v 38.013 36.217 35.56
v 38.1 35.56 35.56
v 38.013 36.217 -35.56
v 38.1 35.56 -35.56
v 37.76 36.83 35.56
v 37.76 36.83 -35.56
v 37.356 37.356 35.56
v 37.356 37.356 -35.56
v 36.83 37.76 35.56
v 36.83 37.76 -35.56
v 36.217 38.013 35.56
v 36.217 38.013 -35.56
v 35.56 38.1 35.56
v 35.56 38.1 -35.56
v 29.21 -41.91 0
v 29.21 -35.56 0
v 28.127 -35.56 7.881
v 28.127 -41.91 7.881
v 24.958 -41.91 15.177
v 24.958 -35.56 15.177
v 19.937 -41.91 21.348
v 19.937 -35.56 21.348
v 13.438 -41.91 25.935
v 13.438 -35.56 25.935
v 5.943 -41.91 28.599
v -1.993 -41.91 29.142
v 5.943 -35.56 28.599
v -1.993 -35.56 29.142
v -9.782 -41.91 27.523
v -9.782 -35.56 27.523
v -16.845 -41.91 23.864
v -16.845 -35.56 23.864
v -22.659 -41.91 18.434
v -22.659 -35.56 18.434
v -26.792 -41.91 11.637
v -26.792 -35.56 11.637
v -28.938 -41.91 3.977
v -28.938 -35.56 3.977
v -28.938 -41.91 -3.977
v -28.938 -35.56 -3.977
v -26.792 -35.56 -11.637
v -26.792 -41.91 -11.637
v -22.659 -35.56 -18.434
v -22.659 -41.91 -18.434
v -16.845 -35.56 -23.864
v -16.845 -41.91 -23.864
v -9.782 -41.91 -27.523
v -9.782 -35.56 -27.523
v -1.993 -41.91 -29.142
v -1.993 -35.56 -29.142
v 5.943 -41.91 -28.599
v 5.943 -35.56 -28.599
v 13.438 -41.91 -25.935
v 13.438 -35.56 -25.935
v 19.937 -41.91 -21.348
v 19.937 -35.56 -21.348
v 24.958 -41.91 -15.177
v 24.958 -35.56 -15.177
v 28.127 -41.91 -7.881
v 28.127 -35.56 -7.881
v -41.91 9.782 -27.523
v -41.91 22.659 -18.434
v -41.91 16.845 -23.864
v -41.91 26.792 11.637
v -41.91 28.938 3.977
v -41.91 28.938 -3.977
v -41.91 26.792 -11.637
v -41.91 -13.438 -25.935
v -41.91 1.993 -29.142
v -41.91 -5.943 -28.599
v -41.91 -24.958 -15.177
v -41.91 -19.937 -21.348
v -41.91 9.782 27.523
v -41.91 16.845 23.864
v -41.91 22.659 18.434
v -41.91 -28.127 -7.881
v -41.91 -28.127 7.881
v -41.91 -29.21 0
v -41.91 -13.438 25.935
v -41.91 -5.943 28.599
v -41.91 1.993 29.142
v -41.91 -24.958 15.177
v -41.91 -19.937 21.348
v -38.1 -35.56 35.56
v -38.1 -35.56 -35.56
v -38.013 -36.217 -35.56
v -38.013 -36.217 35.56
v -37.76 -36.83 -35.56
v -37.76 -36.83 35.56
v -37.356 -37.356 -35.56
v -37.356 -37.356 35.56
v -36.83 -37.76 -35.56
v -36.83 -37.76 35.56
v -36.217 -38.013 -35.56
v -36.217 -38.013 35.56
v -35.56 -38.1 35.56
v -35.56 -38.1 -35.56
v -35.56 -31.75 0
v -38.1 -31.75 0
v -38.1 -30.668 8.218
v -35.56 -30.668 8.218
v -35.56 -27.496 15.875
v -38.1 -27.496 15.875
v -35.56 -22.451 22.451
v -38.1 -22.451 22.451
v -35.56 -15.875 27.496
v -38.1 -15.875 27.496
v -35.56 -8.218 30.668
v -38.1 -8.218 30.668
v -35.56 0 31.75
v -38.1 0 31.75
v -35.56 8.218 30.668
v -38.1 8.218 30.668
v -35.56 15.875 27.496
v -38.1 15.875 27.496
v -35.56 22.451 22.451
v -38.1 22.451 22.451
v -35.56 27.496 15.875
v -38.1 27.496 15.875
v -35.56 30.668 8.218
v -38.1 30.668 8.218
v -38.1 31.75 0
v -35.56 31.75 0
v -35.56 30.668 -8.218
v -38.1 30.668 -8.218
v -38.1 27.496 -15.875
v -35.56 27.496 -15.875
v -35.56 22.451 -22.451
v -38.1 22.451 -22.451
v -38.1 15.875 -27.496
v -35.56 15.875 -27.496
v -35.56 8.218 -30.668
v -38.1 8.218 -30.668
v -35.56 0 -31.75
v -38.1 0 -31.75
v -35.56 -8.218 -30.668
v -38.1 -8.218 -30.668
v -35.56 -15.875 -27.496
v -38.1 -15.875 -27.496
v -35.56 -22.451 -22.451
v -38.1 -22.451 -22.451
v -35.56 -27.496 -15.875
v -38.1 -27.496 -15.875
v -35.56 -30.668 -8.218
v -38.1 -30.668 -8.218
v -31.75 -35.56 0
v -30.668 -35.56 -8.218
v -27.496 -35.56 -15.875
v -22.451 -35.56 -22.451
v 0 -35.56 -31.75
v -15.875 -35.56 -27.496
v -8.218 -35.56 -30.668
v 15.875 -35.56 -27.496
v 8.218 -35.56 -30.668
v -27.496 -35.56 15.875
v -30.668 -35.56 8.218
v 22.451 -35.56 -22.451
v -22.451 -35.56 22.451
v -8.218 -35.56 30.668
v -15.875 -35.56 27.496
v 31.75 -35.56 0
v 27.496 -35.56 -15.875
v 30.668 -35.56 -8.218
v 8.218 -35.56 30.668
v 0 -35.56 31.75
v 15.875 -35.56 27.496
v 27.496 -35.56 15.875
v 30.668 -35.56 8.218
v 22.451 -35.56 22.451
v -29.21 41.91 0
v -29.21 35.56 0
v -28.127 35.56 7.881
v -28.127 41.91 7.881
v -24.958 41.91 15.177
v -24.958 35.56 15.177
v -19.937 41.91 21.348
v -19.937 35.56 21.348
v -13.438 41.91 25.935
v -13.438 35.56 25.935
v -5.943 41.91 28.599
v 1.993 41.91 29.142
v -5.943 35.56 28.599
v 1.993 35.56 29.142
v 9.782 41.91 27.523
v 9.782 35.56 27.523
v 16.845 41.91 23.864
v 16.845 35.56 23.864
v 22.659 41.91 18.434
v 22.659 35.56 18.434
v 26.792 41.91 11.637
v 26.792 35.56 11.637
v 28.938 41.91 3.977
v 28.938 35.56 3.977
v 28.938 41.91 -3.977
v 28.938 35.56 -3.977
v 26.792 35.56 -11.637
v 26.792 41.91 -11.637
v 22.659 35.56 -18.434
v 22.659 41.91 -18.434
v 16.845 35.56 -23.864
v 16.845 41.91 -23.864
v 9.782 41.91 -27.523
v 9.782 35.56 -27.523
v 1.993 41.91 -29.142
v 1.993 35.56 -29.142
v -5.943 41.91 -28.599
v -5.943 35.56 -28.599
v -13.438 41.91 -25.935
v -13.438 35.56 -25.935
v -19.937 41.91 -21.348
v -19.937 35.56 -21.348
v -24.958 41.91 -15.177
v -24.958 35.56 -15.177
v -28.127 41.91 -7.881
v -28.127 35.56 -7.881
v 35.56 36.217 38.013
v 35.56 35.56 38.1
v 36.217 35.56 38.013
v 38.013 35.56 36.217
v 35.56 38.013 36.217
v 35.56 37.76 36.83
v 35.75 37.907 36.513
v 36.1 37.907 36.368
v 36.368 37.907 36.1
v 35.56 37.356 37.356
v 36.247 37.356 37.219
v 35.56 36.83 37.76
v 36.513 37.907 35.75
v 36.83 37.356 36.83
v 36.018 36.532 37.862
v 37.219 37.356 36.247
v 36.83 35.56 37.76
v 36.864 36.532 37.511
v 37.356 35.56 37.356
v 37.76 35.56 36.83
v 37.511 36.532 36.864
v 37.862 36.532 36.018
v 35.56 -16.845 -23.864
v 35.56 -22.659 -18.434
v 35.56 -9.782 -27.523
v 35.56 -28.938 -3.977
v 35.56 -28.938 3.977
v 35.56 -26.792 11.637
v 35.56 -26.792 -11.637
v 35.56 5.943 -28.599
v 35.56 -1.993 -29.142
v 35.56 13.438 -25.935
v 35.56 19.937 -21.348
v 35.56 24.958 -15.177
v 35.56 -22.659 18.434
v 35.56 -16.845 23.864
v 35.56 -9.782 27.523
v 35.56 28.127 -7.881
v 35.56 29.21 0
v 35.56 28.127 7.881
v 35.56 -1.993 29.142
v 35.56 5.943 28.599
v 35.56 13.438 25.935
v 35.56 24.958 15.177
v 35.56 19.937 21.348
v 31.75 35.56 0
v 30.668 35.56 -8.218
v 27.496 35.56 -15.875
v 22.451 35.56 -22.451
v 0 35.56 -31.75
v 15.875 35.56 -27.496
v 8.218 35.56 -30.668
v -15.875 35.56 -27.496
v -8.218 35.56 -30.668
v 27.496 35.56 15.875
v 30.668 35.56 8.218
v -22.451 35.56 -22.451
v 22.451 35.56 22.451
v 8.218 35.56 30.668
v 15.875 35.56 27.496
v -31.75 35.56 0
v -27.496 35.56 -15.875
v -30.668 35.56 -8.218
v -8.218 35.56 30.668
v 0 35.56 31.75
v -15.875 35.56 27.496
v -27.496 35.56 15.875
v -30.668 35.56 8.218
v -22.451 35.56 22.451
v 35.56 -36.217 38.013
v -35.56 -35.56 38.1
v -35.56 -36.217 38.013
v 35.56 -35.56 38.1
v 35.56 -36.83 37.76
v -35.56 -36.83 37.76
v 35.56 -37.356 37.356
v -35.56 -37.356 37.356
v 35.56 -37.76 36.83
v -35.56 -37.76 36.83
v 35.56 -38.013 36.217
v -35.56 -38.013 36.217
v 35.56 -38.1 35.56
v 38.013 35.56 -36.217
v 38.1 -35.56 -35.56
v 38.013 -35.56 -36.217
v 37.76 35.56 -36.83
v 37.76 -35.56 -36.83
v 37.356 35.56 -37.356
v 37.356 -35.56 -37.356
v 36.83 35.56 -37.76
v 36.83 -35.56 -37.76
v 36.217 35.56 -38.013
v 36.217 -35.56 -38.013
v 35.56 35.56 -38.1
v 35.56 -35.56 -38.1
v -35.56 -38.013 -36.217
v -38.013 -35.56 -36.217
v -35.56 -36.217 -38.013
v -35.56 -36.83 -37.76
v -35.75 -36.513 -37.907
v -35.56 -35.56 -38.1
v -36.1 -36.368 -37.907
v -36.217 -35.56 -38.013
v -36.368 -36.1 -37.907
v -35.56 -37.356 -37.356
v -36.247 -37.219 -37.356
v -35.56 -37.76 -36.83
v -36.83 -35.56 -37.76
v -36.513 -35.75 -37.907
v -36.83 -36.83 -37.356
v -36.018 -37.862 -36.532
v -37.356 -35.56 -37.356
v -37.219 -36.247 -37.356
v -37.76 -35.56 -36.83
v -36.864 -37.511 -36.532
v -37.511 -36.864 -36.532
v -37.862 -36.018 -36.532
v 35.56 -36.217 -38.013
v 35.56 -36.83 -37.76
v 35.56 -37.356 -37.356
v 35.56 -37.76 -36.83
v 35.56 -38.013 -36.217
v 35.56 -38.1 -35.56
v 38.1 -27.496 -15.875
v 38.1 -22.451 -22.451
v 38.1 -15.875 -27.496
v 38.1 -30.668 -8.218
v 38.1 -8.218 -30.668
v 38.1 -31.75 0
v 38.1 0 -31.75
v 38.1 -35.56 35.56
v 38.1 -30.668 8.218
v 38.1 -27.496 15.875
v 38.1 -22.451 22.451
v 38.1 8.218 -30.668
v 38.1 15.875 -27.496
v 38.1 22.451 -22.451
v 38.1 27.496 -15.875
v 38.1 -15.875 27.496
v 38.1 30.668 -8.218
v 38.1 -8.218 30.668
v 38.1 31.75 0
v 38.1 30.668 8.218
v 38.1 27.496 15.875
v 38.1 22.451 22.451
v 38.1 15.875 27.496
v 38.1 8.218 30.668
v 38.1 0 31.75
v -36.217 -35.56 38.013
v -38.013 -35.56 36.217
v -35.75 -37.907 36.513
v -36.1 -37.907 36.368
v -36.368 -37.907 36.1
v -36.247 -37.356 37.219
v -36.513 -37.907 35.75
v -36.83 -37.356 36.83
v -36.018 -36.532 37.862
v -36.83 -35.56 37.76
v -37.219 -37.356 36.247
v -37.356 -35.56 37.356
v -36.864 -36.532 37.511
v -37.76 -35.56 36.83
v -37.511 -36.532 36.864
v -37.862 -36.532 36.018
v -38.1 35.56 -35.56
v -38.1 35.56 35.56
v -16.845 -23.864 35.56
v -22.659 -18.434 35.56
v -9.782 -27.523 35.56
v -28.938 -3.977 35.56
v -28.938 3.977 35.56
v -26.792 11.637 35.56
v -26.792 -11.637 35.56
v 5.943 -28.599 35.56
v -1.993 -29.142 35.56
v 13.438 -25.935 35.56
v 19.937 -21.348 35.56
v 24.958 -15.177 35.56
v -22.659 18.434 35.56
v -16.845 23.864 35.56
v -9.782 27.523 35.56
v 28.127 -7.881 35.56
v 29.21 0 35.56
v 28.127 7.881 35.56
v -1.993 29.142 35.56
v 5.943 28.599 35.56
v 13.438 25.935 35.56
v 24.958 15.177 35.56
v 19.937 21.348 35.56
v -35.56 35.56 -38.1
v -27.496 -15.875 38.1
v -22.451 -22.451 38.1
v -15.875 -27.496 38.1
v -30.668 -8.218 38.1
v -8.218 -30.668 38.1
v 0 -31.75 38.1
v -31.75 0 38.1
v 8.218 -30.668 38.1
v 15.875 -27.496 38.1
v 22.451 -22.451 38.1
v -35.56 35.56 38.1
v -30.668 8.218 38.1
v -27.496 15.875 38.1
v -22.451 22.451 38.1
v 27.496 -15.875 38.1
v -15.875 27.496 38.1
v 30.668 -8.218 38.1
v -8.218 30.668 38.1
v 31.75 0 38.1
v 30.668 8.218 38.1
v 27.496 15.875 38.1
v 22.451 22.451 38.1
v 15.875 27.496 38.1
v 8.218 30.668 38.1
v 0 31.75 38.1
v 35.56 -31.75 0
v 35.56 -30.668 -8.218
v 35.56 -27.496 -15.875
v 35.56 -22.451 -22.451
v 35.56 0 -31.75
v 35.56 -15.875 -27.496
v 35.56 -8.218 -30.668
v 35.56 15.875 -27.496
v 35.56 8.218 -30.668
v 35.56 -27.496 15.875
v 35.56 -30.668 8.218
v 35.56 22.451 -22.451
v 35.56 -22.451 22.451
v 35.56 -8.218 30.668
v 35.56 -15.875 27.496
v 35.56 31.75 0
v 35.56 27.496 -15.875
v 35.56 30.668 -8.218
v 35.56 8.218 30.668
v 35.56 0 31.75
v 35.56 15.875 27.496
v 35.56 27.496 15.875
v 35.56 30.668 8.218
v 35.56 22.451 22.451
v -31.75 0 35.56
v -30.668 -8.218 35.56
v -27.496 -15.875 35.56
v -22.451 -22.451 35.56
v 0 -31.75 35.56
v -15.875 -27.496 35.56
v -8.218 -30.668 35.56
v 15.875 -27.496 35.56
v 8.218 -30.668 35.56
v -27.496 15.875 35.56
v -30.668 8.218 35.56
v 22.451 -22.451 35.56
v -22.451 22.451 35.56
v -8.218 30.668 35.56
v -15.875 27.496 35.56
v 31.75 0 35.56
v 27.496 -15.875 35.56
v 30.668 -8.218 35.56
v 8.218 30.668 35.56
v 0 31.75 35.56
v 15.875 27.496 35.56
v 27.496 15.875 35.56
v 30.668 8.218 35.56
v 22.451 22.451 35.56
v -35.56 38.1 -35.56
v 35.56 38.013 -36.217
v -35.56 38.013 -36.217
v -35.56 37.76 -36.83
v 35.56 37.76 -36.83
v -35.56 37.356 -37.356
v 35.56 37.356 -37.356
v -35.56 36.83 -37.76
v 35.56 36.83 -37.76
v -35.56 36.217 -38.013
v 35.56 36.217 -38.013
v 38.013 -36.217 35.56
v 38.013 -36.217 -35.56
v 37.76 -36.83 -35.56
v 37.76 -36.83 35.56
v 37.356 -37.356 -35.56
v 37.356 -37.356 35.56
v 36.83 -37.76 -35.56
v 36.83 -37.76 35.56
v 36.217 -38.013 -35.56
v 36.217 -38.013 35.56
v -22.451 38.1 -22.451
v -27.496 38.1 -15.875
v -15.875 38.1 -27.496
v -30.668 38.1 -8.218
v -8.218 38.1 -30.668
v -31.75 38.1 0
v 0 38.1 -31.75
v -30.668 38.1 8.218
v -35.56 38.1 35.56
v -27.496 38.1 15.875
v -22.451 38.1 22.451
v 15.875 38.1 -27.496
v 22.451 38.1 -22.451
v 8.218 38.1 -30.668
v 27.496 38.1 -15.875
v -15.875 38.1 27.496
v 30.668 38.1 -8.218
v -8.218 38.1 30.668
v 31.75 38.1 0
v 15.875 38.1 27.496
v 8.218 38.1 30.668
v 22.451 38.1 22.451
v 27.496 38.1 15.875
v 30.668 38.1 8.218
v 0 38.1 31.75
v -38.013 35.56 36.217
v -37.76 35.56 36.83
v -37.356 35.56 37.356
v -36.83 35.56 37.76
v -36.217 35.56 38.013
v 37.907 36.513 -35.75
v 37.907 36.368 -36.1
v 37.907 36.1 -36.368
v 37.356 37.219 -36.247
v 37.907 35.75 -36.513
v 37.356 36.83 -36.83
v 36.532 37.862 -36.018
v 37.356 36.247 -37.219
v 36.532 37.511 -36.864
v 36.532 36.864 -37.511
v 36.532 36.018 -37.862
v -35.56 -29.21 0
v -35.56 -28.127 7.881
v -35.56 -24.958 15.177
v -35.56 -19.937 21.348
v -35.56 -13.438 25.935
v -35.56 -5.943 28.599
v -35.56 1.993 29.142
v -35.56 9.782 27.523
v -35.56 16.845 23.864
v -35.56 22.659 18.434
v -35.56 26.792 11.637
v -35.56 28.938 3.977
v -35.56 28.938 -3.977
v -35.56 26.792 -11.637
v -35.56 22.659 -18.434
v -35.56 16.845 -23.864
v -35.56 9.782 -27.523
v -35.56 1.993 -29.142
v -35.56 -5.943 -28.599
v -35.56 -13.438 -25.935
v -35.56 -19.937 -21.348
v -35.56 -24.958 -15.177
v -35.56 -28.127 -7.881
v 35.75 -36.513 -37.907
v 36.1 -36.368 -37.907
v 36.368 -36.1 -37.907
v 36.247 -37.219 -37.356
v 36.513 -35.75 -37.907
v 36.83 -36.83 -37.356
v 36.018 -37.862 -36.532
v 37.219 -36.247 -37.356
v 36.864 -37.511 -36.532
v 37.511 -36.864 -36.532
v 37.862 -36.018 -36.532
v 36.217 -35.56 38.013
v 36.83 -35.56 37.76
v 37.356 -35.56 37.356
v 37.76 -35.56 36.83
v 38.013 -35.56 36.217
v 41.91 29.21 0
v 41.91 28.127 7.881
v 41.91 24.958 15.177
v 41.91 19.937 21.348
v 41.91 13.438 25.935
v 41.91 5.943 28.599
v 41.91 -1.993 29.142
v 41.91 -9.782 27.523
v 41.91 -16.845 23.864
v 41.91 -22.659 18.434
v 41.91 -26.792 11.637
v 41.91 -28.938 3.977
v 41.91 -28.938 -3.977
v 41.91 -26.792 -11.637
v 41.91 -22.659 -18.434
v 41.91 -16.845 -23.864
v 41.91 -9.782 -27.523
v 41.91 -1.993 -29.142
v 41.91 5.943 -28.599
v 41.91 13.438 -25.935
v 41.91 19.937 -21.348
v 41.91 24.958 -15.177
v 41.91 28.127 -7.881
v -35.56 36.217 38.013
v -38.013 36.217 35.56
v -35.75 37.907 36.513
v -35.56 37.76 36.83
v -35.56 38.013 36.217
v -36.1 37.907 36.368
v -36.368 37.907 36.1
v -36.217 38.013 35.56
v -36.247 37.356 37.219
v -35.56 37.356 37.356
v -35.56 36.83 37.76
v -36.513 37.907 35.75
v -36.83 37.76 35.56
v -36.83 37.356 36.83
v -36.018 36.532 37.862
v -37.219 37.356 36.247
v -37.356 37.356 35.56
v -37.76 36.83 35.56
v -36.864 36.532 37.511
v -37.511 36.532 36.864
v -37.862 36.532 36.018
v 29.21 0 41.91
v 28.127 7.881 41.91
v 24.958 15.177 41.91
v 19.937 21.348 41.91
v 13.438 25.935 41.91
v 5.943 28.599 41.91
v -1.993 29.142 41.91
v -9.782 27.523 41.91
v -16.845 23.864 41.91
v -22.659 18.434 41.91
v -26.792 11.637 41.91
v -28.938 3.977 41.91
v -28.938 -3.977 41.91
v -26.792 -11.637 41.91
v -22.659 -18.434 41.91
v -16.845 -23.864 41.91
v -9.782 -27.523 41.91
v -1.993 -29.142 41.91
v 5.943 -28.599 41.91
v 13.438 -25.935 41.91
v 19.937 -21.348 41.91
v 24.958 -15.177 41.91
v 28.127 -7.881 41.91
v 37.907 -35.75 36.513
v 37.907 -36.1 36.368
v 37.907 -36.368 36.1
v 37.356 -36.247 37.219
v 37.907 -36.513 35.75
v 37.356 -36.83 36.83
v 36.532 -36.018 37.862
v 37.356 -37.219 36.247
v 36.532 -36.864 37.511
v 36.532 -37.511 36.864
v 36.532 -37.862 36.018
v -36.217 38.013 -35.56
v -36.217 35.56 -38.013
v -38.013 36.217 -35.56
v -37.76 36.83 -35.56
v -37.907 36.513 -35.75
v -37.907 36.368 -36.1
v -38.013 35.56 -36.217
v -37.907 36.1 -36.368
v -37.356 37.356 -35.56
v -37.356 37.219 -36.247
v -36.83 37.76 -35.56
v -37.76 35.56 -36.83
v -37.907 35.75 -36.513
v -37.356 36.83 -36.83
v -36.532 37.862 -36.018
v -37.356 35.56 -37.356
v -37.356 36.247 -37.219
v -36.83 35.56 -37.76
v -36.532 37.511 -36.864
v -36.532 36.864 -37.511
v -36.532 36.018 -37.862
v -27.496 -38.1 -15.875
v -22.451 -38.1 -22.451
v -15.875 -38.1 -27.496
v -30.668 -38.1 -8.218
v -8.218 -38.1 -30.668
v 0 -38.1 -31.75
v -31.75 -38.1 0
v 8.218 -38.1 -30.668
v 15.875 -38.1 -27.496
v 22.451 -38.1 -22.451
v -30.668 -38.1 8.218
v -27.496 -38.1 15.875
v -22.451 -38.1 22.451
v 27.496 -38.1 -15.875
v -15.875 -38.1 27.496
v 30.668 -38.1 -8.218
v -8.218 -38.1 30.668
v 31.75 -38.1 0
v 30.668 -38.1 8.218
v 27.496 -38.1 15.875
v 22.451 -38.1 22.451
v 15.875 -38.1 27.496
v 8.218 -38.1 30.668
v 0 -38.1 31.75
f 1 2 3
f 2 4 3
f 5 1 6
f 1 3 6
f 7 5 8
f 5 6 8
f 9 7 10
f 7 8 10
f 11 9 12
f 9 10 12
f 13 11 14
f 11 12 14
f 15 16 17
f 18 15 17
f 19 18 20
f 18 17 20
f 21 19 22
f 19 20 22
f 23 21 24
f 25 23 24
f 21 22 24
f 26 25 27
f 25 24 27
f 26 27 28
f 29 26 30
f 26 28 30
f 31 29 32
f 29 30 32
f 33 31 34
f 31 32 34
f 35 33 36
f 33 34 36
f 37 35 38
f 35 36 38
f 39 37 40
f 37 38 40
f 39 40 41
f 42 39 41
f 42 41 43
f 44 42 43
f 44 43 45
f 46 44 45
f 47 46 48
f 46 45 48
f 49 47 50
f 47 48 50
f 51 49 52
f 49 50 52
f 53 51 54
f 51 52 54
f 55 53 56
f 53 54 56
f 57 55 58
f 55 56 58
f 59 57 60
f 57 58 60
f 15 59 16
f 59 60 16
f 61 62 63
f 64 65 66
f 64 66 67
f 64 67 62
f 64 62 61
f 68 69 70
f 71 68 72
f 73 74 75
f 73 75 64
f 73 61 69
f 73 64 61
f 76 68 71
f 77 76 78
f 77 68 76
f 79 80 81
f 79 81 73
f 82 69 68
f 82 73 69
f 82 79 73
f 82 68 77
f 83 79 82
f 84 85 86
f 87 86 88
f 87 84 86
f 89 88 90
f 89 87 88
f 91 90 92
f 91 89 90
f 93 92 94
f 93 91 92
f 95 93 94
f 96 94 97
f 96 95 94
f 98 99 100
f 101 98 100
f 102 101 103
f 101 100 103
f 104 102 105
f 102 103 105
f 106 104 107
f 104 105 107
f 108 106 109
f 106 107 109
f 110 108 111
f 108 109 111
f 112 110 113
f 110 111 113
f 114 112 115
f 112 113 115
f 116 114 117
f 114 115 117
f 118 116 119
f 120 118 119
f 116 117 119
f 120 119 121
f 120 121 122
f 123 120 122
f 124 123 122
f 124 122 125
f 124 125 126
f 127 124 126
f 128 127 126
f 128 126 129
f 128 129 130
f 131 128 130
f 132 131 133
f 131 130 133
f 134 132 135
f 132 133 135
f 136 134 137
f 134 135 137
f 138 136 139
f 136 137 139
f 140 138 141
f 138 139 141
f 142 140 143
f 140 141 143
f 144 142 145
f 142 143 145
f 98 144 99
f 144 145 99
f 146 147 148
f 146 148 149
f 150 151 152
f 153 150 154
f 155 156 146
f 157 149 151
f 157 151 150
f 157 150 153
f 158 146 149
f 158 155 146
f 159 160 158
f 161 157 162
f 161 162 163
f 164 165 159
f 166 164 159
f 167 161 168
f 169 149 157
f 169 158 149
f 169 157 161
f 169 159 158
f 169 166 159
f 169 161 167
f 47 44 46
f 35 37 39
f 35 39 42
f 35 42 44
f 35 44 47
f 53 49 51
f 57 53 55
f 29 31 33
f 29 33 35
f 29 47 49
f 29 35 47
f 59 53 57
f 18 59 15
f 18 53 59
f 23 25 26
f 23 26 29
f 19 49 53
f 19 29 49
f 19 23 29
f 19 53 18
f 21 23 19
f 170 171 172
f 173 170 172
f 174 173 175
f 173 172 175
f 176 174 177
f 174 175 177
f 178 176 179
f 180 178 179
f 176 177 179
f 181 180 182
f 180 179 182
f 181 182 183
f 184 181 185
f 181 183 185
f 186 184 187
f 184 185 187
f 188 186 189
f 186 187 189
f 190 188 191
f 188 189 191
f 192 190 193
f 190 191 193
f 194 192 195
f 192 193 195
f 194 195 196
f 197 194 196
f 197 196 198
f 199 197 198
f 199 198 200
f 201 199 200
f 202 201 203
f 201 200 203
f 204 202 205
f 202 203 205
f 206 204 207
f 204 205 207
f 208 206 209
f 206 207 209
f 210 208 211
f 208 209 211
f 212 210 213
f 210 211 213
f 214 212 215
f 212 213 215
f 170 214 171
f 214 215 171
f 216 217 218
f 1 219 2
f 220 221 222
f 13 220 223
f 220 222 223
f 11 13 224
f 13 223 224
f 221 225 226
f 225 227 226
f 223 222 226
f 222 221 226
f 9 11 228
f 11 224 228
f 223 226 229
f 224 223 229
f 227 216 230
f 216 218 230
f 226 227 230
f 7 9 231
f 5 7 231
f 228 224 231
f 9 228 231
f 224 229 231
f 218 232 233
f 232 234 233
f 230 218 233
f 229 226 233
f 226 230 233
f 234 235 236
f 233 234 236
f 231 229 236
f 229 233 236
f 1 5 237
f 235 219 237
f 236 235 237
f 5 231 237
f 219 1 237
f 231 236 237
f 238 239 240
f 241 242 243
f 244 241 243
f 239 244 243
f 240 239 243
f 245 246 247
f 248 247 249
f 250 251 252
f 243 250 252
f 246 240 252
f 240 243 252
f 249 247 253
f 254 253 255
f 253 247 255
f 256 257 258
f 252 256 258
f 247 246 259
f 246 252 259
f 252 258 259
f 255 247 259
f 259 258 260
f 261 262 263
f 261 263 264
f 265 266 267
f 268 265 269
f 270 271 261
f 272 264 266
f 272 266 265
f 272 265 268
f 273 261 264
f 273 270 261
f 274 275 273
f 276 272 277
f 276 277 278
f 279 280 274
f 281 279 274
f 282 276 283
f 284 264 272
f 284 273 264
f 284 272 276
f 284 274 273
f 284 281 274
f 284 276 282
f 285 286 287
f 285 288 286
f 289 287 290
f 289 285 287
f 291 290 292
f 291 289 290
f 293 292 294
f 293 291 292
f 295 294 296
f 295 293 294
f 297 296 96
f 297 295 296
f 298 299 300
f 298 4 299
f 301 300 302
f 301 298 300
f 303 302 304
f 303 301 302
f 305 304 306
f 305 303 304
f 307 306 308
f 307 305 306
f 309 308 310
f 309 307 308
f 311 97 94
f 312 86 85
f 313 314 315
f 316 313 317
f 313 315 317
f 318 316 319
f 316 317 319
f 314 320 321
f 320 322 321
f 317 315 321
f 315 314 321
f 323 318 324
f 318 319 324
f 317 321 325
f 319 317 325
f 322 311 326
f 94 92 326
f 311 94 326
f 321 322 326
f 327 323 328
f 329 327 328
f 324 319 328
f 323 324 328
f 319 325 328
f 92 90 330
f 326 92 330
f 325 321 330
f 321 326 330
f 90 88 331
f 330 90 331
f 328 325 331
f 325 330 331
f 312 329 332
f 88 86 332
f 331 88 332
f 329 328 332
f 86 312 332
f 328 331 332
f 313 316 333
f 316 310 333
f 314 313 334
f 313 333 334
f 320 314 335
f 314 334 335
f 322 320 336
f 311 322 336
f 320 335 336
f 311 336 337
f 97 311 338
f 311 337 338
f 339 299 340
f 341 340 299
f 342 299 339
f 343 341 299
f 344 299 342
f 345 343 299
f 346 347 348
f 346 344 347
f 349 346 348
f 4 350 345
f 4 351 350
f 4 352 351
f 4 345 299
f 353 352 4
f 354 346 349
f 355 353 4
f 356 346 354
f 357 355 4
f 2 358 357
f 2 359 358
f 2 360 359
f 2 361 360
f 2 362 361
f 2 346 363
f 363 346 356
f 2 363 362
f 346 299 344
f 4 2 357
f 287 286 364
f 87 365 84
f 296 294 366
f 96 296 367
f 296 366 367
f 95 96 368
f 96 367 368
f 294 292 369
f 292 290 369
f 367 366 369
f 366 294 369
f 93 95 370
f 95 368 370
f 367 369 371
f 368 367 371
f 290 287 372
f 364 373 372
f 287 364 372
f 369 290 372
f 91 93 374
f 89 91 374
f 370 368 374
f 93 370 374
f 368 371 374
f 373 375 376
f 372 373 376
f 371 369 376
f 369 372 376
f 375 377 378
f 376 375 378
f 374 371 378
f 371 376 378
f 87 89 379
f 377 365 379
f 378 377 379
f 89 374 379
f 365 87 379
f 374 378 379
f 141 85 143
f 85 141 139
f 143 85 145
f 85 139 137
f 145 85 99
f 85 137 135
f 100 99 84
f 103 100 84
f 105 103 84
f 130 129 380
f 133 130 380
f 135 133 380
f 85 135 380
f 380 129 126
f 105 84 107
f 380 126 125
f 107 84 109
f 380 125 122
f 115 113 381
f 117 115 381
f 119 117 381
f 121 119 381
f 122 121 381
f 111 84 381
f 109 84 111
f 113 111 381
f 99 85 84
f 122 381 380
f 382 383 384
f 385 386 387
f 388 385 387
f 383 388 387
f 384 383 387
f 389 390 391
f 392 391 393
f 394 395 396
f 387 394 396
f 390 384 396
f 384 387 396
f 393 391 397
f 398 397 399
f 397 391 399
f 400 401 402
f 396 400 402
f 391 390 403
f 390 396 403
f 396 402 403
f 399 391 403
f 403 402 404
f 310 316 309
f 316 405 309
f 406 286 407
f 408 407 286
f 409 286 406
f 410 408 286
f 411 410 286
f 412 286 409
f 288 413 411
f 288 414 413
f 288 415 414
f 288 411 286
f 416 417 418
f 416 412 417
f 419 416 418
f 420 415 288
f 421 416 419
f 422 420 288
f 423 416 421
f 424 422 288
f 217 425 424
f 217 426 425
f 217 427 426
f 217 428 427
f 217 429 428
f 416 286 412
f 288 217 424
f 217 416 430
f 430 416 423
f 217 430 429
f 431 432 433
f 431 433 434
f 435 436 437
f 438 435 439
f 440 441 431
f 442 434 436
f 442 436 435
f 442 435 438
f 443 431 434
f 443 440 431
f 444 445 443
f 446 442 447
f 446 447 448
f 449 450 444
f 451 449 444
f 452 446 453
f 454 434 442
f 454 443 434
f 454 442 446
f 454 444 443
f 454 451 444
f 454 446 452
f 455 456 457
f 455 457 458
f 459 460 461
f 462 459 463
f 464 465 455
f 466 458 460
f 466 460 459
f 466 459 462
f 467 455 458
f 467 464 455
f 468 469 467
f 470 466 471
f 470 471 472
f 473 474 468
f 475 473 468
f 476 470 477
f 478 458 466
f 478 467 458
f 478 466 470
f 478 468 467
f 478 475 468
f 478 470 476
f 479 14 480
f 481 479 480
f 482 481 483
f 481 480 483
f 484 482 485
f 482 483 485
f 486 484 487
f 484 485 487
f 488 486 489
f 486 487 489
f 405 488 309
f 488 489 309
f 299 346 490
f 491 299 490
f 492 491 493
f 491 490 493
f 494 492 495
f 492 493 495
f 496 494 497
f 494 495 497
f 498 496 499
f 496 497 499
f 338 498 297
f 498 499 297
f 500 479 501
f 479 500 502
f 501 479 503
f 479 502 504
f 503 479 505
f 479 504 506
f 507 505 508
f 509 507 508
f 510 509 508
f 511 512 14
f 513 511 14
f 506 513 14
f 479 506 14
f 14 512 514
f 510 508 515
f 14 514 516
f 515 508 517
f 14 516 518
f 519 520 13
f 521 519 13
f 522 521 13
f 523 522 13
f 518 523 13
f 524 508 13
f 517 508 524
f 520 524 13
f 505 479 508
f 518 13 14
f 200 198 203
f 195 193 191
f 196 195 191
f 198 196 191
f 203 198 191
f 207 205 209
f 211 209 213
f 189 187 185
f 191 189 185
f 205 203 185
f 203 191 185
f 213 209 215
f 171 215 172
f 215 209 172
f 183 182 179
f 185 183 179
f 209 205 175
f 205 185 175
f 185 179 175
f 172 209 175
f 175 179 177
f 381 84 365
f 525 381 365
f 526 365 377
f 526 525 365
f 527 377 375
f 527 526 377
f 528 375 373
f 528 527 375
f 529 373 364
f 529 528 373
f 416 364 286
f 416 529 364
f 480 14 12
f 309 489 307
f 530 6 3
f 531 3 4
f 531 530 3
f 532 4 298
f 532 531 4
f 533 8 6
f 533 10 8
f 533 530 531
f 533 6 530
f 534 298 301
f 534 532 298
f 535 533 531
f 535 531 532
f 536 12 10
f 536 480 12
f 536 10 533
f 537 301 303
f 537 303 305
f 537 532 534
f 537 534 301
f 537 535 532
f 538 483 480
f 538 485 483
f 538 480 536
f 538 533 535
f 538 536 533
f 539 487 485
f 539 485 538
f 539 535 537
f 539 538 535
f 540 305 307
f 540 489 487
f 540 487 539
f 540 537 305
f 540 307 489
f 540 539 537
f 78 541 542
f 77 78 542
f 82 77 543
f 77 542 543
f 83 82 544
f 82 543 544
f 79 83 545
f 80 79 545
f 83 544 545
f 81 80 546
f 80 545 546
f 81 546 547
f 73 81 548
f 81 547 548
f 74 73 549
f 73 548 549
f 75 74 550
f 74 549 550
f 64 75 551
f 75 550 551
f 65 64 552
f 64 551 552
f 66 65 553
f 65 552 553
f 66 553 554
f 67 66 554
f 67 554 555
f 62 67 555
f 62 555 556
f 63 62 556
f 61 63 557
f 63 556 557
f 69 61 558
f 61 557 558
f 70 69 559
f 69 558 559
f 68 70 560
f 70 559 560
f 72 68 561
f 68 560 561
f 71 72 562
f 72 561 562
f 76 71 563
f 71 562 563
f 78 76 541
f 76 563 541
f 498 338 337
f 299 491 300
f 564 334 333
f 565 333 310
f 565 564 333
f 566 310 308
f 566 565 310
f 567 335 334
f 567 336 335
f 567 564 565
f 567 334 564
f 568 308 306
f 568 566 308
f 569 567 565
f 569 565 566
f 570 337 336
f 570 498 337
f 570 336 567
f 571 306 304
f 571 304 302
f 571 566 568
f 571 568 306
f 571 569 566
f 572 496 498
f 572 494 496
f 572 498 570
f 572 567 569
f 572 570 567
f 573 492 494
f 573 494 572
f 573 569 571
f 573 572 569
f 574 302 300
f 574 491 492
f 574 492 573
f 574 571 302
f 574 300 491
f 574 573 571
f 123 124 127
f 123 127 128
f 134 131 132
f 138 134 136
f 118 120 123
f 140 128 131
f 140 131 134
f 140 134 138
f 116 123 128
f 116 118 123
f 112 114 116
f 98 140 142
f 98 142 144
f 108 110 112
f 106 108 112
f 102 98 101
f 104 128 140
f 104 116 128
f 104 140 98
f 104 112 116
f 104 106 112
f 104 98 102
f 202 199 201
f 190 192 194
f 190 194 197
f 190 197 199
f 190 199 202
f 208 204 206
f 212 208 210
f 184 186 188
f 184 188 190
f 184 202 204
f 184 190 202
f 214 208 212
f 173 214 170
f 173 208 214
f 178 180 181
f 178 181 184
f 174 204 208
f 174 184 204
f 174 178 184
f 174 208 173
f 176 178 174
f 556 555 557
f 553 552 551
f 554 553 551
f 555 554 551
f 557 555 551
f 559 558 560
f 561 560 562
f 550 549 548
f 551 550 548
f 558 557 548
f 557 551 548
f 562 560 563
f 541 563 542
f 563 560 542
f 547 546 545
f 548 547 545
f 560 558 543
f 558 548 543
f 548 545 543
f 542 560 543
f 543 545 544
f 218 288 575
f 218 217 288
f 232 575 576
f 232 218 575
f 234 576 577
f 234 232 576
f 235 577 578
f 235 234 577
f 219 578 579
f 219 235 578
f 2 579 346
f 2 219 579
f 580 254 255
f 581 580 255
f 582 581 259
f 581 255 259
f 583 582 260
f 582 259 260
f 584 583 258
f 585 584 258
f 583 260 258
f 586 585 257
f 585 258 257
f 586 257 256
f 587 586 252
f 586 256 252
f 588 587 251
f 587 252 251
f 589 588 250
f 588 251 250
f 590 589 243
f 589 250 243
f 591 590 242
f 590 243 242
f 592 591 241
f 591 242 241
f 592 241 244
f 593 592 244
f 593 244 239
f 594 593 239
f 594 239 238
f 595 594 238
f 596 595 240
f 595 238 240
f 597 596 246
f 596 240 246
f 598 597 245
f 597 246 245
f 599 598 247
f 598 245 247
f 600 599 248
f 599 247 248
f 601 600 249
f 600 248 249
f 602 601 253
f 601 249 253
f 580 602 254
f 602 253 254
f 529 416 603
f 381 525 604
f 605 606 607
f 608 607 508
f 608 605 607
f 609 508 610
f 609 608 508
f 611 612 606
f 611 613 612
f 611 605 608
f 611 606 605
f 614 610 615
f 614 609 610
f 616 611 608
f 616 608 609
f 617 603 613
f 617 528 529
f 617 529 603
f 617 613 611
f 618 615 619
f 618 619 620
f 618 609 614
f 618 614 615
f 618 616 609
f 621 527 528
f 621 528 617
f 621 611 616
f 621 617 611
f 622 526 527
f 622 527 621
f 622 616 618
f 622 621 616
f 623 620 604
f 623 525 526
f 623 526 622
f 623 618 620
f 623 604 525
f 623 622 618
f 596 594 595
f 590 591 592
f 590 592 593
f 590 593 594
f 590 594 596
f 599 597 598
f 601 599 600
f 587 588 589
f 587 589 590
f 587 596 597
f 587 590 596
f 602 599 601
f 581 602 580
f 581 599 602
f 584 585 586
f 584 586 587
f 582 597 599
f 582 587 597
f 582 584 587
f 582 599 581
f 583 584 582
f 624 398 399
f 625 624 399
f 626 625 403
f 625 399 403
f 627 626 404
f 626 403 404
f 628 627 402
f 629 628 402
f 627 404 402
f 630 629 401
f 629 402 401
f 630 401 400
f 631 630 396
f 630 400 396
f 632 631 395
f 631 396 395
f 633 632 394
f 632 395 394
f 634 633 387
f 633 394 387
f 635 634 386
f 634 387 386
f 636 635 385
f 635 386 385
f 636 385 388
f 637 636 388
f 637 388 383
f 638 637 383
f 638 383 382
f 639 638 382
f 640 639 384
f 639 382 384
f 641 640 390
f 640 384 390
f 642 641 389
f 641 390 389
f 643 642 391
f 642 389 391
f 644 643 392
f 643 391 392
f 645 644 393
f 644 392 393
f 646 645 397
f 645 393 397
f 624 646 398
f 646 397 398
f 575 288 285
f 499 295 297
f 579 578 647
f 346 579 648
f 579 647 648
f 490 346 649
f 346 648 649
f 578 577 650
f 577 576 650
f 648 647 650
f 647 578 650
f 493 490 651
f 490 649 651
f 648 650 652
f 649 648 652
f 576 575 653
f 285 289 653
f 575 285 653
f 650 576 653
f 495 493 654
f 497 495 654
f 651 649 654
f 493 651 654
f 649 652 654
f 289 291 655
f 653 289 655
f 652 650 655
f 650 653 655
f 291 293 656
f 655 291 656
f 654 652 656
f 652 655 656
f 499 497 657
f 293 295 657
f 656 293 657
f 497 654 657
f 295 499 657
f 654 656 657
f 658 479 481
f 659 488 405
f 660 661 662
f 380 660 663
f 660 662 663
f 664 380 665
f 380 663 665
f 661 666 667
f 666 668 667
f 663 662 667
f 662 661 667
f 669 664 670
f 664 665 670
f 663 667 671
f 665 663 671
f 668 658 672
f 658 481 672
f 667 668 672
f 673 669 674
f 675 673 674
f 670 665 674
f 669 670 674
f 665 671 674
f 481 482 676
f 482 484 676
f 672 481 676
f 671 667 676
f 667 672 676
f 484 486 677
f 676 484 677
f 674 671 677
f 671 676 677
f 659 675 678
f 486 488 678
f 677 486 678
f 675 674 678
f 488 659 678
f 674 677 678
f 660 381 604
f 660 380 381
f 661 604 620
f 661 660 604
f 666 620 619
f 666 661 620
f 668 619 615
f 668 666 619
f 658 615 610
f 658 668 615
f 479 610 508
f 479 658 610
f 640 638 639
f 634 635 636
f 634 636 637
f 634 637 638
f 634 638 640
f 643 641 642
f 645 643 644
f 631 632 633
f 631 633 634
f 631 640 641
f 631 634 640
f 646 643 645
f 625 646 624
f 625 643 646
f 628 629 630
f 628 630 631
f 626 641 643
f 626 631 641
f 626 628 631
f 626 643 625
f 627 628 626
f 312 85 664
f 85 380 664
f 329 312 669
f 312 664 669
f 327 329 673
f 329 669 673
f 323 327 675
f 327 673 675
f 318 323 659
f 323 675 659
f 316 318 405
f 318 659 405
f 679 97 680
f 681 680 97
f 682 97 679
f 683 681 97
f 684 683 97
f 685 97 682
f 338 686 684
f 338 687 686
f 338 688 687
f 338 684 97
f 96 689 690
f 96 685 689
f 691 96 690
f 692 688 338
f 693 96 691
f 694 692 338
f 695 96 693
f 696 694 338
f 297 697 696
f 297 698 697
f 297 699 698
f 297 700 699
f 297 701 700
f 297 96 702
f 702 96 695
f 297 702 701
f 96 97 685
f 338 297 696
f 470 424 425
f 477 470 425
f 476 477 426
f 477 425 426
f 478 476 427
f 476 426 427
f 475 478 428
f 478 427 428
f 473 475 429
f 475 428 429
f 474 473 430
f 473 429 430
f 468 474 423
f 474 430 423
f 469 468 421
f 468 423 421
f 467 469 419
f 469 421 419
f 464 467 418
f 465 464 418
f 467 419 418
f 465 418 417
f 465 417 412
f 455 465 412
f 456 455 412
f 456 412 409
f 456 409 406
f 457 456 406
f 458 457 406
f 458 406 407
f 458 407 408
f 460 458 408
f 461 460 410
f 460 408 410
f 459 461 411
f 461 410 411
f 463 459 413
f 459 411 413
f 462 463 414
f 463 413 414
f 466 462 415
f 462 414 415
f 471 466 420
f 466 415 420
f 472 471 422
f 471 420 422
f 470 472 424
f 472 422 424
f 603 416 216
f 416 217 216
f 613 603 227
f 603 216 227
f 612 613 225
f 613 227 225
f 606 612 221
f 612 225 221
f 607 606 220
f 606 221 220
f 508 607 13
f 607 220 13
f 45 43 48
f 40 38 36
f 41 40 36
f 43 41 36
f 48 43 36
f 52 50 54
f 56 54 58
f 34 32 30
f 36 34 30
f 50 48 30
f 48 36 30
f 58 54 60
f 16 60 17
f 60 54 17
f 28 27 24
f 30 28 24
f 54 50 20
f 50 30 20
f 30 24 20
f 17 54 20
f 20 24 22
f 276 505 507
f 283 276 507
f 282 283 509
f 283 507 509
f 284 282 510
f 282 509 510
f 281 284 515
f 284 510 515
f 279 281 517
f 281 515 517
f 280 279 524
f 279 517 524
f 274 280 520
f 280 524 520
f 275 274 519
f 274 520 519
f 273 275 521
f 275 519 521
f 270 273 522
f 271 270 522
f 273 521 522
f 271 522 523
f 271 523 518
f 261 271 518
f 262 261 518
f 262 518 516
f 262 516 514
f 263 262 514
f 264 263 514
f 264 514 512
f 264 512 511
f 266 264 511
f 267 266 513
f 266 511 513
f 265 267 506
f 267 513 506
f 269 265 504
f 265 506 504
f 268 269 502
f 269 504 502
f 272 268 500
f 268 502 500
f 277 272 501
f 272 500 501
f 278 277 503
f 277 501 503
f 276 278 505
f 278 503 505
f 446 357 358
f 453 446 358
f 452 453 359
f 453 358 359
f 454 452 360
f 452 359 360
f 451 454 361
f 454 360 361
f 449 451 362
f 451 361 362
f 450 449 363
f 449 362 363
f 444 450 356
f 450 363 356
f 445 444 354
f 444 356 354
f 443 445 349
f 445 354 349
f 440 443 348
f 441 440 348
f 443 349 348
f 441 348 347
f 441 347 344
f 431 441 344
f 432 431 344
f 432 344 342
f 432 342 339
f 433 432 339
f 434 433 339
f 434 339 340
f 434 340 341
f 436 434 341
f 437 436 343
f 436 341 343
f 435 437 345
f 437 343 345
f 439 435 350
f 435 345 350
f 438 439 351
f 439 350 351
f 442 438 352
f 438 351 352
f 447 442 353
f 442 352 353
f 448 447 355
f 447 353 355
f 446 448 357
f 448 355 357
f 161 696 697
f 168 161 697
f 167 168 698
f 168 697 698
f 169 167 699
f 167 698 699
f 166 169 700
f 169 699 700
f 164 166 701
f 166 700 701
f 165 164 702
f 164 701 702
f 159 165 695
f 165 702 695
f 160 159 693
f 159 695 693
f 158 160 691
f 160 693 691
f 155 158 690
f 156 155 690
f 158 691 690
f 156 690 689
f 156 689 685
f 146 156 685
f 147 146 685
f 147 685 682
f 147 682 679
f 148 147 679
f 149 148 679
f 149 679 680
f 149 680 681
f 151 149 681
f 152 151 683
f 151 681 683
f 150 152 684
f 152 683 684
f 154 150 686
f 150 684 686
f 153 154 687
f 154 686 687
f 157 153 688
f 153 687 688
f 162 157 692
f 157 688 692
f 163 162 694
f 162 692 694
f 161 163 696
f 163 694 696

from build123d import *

# Parameters (mm, degrees)
F0_W      = 76.2
F0_H      = 76.2
F1_DEPTH  = 38.1
F2_R      = 2.54
F3_R      = 31.75
F4_DEPTH  = 2.54
F5_R      = 29.21
F6_DEPTH  = 6.35
F7_R      = 31.75
F8_DEPTH  = 2.54
F9_R      = 29.21
F10_DEPTH = 6.35
F11_R     = 31.75
F12_DEPTH = 2.54
F13_R     = 31.75
F14_DEPTH = 2.54
F15_R     = 31.75
F16_DEPTH = 2.54
F17_R     = 29.21
F18_DEPTH = 6.35
F19_R     = 29.21
F20_DEPTH = 6.35
F21_R     = 29.21
F22_DEPTH = 6.35


with BuildPart() as f1:
    # F0 (on Top) → F1 (new body, symmetric)
    with BuildSketch(Plane.XY):
        Rectangle(F0_W, F0_H)
    extrude(amount=F1_DEPTH, both=True)

    # F2
    f2_edges = [f1.edges().sort_by_distance(p)[0] for p in [
        (-38.1, 0, 38.1),
        (0, -38.1, 38.1),
        (38.1, 0, 38.1),
        (0, 38.1, 38.1),
        (38.1, -38.1, 0),
        (-38.1, -38.1, 0),
        (0, -38.1, -38.1),
        (0, 38.1, -38.1),
        (-38.1, 38.1, 0),
        (38.1, 38.1, 0),
        (-38.1, 0, -38.1),
        (38.1, 0, -38.1),
    ]]
    fillet(f2_edges, radius=F2_R)

    # F3 (on face) → F4 (cut)
    with BuildSketch(Plane.XY.offset(38.1)):
        Circle(F3_R)
    extrude(amount=-F4_DEPTH, mode=Mode.SUBTRACT)

    # F7 (on face) → F8 (cut)
    with BuildSketch(Plane(origin=(-38.1, 0, 0), x_dir=(0, -1, 0), z_dir=(-1, 0, 0))):
        Circle(F7_R)
    extrude(amount=-F8_DEPTH, mode=Mode.SUBTRACT)

    # F11 (on face) → F12 (cut)
    with BuildSketch(Plane.YZ.offset(38.1)):
        Circle(F11_R)
    extrude(amount=-F12_DEPTH, mode=Mode.SUBTRACT)

    # F13 (on face) → F14 (cut)
    with BuildSketch(Plane(origin=(0, 38.1, 0), x_dir=(-1, 0, 0), z_dir=(0, 1, 0))):
        Circle(F13_R)
    extrude(amount=-F14_DEPTH, mode=Mode.SUBTRACT)

    # F15 (on face) → F16 (cut)
    with BuildSketch(Plane.XZ.offset(38.1)):
        Circle(F15_R)
    extrude(amount=-F16_DEPTH, mode=Mode.SUBTRACT)


with BuildPart() as f6:
    # F5 (on face) → F6 (new body)
    with BuildSketch(Plane.XY.offset(35.56)):
        Circle(F5_R)
    extrude(amount=F6_DEPTH)


with BuildPart() as f10:
    # F9 (on face) → F10 (new body)
    with BuildSketch(Plane(origin=(-35.56, 0, 0), x_dir=(0, -1, 0), z_dir=(-1, 0, 0))):
        Circle(F9_R)
    extrude(amount=F10_DEPTH)


with BuildPart() as f18:
    # F17 (on face) → F18 (new body)
    with BuildSketch(Plane.YZ.offset(35.56)):
        Circle(F17_R)
    extrude(amount=F18_DEPTH)


with BuildPart() as f20:
    # F19 (on face) → F20 (new body)
    with BuildSketch(Plane(origin=(0, 35.56, 0), x_dir=(-1, 0, 0), z_dir=(0, 1, 0))):
        Circle(F19_R)
    extrude(amount=F20_DEPTH)


with BuildPart() as f22:
    # F21 (on face) → F22 (new body)
    with BuildSketch(Plane.XZ.offset(35.56)):
        Circle(F21_R)
    extrude(amount=F22_DEPTH)


solid = Compound([f1.part, f6.part, f10.part, f18.part, f20.part, f22.part])
